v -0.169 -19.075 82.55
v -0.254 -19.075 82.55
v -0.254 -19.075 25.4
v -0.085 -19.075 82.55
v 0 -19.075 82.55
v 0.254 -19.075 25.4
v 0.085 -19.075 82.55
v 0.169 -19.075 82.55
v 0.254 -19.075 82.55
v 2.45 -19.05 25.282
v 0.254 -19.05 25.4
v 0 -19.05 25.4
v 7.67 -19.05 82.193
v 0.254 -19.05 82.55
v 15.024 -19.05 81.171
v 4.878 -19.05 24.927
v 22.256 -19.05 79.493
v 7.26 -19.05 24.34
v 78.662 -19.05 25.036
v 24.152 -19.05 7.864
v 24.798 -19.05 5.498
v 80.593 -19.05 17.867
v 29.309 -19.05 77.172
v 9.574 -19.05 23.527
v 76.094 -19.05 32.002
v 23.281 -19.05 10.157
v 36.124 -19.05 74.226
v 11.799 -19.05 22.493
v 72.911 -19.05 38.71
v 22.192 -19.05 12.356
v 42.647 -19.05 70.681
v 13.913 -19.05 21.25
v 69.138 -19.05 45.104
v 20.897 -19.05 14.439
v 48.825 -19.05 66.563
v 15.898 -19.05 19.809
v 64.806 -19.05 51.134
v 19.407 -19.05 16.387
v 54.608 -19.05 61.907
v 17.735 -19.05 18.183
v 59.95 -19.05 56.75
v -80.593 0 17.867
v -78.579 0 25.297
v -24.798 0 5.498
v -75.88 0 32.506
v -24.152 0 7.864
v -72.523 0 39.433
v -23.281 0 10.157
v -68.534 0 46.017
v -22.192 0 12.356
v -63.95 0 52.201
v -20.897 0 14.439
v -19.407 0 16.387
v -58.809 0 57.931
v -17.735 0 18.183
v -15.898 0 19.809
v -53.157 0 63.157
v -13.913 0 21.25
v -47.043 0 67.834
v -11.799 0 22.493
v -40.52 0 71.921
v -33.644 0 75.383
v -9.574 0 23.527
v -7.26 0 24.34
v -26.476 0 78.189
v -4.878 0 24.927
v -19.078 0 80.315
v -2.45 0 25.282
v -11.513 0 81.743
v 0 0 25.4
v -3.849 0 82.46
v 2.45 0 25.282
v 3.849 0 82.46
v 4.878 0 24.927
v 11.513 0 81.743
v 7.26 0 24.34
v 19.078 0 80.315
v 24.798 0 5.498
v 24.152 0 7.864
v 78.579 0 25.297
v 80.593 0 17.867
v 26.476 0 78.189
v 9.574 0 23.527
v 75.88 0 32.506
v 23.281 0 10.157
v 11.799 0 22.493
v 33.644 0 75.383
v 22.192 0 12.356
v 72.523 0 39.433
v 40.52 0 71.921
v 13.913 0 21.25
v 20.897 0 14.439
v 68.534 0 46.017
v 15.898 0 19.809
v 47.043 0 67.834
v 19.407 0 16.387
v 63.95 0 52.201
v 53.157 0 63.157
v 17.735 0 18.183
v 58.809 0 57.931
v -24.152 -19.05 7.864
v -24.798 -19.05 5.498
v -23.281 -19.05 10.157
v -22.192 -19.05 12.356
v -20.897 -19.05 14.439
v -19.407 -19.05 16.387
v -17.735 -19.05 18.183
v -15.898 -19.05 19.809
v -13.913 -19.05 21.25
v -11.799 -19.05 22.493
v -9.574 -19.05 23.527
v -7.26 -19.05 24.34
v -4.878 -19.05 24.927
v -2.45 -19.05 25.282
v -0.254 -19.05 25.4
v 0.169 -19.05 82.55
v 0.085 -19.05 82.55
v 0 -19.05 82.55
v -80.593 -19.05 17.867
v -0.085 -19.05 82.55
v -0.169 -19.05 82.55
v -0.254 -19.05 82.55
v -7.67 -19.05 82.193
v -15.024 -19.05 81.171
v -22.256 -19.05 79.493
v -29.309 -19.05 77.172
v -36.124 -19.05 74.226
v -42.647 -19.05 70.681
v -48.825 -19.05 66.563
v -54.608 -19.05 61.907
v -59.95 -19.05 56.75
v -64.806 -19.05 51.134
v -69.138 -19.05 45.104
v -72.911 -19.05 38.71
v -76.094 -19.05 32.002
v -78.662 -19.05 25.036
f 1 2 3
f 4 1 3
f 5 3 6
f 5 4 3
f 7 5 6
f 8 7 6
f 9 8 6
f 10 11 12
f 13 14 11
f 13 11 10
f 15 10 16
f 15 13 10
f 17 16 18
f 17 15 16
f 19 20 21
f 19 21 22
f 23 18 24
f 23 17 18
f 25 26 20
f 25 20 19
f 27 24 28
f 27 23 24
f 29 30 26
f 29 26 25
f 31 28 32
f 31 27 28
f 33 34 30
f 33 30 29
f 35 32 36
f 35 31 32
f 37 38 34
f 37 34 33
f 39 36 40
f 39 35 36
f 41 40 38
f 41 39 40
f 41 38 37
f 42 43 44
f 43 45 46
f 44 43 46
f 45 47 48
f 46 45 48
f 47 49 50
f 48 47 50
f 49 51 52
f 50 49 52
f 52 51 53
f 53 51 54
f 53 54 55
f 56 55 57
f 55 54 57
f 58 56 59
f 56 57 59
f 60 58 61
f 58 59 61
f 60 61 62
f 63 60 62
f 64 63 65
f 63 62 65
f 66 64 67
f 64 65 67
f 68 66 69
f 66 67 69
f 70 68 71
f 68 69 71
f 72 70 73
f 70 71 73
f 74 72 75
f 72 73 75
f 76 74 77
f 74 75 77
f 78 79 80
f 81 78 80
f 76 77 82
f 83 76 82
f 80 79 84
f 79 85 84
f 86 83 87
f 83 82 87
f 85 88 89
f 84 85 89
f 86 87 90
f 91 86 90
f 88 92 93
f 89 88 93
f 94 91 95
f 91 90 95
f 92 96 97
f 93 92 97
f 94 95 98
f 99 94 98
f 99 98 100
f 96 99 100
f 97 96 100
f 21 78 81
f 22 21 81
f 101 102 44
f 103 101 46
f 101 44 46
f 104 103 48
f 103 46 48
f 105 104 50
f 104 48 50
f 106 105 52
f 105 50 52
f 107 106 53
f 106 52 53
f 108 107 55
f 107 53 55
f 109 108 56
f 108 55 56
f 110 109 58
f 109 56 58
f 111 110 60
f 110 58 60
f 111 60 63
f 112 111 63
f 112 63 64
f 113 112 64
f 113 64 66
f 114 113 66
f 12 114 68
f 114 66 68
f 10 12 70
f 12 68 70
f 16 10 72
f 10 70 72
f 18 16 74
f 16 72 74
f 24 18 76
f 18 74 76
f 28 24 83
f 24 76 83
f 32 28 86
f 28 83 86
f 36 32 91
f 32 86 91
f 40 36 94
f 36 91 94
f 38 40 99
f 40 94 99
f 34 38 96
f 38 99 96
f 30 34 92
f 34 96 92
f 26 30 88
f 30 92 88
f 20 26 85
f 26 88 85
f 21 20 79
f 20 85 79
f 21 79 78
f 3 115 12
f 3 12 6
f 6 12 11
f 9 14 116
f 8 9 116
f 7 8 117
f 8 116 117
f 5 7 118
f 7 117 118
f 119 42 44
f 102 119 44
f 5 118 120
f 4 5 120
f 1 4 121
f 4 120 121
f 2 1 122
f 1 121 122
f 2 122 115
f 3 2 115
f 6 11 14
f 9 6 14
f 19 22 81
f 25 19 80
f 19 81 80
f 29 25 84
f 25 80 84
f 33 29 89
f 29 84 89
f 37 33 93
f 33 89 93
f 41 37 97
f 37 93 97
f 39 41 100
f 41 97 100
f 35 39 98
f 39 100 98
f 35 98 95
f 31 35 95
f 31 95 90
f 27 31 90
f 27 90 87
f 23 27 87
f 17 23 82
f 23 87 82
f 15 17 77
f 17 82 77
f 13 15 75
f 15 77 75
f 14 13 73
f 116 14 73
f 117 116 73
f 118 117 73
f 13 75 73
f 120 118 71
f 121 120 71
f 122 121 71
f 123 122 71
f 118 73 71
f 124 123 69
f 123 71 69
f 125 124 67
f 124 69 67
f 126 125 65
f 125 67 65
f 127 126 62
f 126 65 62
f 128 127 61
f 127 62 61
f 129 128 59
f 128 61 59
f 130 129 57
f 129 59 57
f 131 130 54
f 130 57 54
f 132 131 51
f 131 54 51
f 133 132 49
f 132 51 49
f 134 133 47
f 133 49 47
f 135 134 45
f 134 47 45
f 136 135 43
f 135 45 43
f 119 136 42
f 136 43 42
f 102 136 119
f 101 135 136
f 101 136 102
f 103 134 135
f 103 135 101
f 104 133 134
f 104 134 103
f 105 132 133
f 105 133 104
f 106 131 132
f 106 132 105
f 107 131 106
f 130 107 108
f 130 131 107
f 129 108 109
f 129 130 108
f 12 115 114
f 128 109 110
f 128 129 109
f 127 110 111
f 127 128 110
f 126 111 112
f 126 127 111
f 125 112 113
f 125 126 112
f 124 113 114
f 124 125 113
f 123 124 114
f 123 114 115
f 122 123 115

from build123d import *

# Parameters (mm, degrees)
F1_DEPTH = 19.05
F3_DEPTH = 0.0254


with BuildPart() as f1:
    # F0 (on Front) → F1 (new body)
    with BuildSketch(Plane.XZ):
        with BuildLine():
            ThreePointArc((-24.797919, 5.497566), (0, 25.4), (24.797919, 5.497566))
            Line((24.797919, 5.497566), (80.593235, 17.86709))
            ThreePointArc((80.593235, 17.86709), (0, 82.55), (-80.593235, 17.86709))
            Line((-80.593235, 17.86709), (-24.797919, 5.497566))
        make_face()
    extrude(amount=F1_DEPTH)

    # F2 (on face) → F3 (join)
    with BuildSketch(Plane.XZ.offset(19.05)):
        with BuildLine():
            Line((-0.254, 25.4), (0, 25.4))
            Line((0, 25.4), (0.254, 25.4))
            Line((0.254, 25.4), (0.254, 82.549609))
            ThreePointArc((0.254, 82.549609), (0.127, 82.549902), (0, 82.55))
            ThreePointArc((0, 82.55), (-0.127, 82.549902), (-0.254, 82.549609))
            Line((-0.254, 82.549609), (-0.254, 25.4))
        make_face()
    extrude(amount=F3_DEPTH)


solid = f1.part
